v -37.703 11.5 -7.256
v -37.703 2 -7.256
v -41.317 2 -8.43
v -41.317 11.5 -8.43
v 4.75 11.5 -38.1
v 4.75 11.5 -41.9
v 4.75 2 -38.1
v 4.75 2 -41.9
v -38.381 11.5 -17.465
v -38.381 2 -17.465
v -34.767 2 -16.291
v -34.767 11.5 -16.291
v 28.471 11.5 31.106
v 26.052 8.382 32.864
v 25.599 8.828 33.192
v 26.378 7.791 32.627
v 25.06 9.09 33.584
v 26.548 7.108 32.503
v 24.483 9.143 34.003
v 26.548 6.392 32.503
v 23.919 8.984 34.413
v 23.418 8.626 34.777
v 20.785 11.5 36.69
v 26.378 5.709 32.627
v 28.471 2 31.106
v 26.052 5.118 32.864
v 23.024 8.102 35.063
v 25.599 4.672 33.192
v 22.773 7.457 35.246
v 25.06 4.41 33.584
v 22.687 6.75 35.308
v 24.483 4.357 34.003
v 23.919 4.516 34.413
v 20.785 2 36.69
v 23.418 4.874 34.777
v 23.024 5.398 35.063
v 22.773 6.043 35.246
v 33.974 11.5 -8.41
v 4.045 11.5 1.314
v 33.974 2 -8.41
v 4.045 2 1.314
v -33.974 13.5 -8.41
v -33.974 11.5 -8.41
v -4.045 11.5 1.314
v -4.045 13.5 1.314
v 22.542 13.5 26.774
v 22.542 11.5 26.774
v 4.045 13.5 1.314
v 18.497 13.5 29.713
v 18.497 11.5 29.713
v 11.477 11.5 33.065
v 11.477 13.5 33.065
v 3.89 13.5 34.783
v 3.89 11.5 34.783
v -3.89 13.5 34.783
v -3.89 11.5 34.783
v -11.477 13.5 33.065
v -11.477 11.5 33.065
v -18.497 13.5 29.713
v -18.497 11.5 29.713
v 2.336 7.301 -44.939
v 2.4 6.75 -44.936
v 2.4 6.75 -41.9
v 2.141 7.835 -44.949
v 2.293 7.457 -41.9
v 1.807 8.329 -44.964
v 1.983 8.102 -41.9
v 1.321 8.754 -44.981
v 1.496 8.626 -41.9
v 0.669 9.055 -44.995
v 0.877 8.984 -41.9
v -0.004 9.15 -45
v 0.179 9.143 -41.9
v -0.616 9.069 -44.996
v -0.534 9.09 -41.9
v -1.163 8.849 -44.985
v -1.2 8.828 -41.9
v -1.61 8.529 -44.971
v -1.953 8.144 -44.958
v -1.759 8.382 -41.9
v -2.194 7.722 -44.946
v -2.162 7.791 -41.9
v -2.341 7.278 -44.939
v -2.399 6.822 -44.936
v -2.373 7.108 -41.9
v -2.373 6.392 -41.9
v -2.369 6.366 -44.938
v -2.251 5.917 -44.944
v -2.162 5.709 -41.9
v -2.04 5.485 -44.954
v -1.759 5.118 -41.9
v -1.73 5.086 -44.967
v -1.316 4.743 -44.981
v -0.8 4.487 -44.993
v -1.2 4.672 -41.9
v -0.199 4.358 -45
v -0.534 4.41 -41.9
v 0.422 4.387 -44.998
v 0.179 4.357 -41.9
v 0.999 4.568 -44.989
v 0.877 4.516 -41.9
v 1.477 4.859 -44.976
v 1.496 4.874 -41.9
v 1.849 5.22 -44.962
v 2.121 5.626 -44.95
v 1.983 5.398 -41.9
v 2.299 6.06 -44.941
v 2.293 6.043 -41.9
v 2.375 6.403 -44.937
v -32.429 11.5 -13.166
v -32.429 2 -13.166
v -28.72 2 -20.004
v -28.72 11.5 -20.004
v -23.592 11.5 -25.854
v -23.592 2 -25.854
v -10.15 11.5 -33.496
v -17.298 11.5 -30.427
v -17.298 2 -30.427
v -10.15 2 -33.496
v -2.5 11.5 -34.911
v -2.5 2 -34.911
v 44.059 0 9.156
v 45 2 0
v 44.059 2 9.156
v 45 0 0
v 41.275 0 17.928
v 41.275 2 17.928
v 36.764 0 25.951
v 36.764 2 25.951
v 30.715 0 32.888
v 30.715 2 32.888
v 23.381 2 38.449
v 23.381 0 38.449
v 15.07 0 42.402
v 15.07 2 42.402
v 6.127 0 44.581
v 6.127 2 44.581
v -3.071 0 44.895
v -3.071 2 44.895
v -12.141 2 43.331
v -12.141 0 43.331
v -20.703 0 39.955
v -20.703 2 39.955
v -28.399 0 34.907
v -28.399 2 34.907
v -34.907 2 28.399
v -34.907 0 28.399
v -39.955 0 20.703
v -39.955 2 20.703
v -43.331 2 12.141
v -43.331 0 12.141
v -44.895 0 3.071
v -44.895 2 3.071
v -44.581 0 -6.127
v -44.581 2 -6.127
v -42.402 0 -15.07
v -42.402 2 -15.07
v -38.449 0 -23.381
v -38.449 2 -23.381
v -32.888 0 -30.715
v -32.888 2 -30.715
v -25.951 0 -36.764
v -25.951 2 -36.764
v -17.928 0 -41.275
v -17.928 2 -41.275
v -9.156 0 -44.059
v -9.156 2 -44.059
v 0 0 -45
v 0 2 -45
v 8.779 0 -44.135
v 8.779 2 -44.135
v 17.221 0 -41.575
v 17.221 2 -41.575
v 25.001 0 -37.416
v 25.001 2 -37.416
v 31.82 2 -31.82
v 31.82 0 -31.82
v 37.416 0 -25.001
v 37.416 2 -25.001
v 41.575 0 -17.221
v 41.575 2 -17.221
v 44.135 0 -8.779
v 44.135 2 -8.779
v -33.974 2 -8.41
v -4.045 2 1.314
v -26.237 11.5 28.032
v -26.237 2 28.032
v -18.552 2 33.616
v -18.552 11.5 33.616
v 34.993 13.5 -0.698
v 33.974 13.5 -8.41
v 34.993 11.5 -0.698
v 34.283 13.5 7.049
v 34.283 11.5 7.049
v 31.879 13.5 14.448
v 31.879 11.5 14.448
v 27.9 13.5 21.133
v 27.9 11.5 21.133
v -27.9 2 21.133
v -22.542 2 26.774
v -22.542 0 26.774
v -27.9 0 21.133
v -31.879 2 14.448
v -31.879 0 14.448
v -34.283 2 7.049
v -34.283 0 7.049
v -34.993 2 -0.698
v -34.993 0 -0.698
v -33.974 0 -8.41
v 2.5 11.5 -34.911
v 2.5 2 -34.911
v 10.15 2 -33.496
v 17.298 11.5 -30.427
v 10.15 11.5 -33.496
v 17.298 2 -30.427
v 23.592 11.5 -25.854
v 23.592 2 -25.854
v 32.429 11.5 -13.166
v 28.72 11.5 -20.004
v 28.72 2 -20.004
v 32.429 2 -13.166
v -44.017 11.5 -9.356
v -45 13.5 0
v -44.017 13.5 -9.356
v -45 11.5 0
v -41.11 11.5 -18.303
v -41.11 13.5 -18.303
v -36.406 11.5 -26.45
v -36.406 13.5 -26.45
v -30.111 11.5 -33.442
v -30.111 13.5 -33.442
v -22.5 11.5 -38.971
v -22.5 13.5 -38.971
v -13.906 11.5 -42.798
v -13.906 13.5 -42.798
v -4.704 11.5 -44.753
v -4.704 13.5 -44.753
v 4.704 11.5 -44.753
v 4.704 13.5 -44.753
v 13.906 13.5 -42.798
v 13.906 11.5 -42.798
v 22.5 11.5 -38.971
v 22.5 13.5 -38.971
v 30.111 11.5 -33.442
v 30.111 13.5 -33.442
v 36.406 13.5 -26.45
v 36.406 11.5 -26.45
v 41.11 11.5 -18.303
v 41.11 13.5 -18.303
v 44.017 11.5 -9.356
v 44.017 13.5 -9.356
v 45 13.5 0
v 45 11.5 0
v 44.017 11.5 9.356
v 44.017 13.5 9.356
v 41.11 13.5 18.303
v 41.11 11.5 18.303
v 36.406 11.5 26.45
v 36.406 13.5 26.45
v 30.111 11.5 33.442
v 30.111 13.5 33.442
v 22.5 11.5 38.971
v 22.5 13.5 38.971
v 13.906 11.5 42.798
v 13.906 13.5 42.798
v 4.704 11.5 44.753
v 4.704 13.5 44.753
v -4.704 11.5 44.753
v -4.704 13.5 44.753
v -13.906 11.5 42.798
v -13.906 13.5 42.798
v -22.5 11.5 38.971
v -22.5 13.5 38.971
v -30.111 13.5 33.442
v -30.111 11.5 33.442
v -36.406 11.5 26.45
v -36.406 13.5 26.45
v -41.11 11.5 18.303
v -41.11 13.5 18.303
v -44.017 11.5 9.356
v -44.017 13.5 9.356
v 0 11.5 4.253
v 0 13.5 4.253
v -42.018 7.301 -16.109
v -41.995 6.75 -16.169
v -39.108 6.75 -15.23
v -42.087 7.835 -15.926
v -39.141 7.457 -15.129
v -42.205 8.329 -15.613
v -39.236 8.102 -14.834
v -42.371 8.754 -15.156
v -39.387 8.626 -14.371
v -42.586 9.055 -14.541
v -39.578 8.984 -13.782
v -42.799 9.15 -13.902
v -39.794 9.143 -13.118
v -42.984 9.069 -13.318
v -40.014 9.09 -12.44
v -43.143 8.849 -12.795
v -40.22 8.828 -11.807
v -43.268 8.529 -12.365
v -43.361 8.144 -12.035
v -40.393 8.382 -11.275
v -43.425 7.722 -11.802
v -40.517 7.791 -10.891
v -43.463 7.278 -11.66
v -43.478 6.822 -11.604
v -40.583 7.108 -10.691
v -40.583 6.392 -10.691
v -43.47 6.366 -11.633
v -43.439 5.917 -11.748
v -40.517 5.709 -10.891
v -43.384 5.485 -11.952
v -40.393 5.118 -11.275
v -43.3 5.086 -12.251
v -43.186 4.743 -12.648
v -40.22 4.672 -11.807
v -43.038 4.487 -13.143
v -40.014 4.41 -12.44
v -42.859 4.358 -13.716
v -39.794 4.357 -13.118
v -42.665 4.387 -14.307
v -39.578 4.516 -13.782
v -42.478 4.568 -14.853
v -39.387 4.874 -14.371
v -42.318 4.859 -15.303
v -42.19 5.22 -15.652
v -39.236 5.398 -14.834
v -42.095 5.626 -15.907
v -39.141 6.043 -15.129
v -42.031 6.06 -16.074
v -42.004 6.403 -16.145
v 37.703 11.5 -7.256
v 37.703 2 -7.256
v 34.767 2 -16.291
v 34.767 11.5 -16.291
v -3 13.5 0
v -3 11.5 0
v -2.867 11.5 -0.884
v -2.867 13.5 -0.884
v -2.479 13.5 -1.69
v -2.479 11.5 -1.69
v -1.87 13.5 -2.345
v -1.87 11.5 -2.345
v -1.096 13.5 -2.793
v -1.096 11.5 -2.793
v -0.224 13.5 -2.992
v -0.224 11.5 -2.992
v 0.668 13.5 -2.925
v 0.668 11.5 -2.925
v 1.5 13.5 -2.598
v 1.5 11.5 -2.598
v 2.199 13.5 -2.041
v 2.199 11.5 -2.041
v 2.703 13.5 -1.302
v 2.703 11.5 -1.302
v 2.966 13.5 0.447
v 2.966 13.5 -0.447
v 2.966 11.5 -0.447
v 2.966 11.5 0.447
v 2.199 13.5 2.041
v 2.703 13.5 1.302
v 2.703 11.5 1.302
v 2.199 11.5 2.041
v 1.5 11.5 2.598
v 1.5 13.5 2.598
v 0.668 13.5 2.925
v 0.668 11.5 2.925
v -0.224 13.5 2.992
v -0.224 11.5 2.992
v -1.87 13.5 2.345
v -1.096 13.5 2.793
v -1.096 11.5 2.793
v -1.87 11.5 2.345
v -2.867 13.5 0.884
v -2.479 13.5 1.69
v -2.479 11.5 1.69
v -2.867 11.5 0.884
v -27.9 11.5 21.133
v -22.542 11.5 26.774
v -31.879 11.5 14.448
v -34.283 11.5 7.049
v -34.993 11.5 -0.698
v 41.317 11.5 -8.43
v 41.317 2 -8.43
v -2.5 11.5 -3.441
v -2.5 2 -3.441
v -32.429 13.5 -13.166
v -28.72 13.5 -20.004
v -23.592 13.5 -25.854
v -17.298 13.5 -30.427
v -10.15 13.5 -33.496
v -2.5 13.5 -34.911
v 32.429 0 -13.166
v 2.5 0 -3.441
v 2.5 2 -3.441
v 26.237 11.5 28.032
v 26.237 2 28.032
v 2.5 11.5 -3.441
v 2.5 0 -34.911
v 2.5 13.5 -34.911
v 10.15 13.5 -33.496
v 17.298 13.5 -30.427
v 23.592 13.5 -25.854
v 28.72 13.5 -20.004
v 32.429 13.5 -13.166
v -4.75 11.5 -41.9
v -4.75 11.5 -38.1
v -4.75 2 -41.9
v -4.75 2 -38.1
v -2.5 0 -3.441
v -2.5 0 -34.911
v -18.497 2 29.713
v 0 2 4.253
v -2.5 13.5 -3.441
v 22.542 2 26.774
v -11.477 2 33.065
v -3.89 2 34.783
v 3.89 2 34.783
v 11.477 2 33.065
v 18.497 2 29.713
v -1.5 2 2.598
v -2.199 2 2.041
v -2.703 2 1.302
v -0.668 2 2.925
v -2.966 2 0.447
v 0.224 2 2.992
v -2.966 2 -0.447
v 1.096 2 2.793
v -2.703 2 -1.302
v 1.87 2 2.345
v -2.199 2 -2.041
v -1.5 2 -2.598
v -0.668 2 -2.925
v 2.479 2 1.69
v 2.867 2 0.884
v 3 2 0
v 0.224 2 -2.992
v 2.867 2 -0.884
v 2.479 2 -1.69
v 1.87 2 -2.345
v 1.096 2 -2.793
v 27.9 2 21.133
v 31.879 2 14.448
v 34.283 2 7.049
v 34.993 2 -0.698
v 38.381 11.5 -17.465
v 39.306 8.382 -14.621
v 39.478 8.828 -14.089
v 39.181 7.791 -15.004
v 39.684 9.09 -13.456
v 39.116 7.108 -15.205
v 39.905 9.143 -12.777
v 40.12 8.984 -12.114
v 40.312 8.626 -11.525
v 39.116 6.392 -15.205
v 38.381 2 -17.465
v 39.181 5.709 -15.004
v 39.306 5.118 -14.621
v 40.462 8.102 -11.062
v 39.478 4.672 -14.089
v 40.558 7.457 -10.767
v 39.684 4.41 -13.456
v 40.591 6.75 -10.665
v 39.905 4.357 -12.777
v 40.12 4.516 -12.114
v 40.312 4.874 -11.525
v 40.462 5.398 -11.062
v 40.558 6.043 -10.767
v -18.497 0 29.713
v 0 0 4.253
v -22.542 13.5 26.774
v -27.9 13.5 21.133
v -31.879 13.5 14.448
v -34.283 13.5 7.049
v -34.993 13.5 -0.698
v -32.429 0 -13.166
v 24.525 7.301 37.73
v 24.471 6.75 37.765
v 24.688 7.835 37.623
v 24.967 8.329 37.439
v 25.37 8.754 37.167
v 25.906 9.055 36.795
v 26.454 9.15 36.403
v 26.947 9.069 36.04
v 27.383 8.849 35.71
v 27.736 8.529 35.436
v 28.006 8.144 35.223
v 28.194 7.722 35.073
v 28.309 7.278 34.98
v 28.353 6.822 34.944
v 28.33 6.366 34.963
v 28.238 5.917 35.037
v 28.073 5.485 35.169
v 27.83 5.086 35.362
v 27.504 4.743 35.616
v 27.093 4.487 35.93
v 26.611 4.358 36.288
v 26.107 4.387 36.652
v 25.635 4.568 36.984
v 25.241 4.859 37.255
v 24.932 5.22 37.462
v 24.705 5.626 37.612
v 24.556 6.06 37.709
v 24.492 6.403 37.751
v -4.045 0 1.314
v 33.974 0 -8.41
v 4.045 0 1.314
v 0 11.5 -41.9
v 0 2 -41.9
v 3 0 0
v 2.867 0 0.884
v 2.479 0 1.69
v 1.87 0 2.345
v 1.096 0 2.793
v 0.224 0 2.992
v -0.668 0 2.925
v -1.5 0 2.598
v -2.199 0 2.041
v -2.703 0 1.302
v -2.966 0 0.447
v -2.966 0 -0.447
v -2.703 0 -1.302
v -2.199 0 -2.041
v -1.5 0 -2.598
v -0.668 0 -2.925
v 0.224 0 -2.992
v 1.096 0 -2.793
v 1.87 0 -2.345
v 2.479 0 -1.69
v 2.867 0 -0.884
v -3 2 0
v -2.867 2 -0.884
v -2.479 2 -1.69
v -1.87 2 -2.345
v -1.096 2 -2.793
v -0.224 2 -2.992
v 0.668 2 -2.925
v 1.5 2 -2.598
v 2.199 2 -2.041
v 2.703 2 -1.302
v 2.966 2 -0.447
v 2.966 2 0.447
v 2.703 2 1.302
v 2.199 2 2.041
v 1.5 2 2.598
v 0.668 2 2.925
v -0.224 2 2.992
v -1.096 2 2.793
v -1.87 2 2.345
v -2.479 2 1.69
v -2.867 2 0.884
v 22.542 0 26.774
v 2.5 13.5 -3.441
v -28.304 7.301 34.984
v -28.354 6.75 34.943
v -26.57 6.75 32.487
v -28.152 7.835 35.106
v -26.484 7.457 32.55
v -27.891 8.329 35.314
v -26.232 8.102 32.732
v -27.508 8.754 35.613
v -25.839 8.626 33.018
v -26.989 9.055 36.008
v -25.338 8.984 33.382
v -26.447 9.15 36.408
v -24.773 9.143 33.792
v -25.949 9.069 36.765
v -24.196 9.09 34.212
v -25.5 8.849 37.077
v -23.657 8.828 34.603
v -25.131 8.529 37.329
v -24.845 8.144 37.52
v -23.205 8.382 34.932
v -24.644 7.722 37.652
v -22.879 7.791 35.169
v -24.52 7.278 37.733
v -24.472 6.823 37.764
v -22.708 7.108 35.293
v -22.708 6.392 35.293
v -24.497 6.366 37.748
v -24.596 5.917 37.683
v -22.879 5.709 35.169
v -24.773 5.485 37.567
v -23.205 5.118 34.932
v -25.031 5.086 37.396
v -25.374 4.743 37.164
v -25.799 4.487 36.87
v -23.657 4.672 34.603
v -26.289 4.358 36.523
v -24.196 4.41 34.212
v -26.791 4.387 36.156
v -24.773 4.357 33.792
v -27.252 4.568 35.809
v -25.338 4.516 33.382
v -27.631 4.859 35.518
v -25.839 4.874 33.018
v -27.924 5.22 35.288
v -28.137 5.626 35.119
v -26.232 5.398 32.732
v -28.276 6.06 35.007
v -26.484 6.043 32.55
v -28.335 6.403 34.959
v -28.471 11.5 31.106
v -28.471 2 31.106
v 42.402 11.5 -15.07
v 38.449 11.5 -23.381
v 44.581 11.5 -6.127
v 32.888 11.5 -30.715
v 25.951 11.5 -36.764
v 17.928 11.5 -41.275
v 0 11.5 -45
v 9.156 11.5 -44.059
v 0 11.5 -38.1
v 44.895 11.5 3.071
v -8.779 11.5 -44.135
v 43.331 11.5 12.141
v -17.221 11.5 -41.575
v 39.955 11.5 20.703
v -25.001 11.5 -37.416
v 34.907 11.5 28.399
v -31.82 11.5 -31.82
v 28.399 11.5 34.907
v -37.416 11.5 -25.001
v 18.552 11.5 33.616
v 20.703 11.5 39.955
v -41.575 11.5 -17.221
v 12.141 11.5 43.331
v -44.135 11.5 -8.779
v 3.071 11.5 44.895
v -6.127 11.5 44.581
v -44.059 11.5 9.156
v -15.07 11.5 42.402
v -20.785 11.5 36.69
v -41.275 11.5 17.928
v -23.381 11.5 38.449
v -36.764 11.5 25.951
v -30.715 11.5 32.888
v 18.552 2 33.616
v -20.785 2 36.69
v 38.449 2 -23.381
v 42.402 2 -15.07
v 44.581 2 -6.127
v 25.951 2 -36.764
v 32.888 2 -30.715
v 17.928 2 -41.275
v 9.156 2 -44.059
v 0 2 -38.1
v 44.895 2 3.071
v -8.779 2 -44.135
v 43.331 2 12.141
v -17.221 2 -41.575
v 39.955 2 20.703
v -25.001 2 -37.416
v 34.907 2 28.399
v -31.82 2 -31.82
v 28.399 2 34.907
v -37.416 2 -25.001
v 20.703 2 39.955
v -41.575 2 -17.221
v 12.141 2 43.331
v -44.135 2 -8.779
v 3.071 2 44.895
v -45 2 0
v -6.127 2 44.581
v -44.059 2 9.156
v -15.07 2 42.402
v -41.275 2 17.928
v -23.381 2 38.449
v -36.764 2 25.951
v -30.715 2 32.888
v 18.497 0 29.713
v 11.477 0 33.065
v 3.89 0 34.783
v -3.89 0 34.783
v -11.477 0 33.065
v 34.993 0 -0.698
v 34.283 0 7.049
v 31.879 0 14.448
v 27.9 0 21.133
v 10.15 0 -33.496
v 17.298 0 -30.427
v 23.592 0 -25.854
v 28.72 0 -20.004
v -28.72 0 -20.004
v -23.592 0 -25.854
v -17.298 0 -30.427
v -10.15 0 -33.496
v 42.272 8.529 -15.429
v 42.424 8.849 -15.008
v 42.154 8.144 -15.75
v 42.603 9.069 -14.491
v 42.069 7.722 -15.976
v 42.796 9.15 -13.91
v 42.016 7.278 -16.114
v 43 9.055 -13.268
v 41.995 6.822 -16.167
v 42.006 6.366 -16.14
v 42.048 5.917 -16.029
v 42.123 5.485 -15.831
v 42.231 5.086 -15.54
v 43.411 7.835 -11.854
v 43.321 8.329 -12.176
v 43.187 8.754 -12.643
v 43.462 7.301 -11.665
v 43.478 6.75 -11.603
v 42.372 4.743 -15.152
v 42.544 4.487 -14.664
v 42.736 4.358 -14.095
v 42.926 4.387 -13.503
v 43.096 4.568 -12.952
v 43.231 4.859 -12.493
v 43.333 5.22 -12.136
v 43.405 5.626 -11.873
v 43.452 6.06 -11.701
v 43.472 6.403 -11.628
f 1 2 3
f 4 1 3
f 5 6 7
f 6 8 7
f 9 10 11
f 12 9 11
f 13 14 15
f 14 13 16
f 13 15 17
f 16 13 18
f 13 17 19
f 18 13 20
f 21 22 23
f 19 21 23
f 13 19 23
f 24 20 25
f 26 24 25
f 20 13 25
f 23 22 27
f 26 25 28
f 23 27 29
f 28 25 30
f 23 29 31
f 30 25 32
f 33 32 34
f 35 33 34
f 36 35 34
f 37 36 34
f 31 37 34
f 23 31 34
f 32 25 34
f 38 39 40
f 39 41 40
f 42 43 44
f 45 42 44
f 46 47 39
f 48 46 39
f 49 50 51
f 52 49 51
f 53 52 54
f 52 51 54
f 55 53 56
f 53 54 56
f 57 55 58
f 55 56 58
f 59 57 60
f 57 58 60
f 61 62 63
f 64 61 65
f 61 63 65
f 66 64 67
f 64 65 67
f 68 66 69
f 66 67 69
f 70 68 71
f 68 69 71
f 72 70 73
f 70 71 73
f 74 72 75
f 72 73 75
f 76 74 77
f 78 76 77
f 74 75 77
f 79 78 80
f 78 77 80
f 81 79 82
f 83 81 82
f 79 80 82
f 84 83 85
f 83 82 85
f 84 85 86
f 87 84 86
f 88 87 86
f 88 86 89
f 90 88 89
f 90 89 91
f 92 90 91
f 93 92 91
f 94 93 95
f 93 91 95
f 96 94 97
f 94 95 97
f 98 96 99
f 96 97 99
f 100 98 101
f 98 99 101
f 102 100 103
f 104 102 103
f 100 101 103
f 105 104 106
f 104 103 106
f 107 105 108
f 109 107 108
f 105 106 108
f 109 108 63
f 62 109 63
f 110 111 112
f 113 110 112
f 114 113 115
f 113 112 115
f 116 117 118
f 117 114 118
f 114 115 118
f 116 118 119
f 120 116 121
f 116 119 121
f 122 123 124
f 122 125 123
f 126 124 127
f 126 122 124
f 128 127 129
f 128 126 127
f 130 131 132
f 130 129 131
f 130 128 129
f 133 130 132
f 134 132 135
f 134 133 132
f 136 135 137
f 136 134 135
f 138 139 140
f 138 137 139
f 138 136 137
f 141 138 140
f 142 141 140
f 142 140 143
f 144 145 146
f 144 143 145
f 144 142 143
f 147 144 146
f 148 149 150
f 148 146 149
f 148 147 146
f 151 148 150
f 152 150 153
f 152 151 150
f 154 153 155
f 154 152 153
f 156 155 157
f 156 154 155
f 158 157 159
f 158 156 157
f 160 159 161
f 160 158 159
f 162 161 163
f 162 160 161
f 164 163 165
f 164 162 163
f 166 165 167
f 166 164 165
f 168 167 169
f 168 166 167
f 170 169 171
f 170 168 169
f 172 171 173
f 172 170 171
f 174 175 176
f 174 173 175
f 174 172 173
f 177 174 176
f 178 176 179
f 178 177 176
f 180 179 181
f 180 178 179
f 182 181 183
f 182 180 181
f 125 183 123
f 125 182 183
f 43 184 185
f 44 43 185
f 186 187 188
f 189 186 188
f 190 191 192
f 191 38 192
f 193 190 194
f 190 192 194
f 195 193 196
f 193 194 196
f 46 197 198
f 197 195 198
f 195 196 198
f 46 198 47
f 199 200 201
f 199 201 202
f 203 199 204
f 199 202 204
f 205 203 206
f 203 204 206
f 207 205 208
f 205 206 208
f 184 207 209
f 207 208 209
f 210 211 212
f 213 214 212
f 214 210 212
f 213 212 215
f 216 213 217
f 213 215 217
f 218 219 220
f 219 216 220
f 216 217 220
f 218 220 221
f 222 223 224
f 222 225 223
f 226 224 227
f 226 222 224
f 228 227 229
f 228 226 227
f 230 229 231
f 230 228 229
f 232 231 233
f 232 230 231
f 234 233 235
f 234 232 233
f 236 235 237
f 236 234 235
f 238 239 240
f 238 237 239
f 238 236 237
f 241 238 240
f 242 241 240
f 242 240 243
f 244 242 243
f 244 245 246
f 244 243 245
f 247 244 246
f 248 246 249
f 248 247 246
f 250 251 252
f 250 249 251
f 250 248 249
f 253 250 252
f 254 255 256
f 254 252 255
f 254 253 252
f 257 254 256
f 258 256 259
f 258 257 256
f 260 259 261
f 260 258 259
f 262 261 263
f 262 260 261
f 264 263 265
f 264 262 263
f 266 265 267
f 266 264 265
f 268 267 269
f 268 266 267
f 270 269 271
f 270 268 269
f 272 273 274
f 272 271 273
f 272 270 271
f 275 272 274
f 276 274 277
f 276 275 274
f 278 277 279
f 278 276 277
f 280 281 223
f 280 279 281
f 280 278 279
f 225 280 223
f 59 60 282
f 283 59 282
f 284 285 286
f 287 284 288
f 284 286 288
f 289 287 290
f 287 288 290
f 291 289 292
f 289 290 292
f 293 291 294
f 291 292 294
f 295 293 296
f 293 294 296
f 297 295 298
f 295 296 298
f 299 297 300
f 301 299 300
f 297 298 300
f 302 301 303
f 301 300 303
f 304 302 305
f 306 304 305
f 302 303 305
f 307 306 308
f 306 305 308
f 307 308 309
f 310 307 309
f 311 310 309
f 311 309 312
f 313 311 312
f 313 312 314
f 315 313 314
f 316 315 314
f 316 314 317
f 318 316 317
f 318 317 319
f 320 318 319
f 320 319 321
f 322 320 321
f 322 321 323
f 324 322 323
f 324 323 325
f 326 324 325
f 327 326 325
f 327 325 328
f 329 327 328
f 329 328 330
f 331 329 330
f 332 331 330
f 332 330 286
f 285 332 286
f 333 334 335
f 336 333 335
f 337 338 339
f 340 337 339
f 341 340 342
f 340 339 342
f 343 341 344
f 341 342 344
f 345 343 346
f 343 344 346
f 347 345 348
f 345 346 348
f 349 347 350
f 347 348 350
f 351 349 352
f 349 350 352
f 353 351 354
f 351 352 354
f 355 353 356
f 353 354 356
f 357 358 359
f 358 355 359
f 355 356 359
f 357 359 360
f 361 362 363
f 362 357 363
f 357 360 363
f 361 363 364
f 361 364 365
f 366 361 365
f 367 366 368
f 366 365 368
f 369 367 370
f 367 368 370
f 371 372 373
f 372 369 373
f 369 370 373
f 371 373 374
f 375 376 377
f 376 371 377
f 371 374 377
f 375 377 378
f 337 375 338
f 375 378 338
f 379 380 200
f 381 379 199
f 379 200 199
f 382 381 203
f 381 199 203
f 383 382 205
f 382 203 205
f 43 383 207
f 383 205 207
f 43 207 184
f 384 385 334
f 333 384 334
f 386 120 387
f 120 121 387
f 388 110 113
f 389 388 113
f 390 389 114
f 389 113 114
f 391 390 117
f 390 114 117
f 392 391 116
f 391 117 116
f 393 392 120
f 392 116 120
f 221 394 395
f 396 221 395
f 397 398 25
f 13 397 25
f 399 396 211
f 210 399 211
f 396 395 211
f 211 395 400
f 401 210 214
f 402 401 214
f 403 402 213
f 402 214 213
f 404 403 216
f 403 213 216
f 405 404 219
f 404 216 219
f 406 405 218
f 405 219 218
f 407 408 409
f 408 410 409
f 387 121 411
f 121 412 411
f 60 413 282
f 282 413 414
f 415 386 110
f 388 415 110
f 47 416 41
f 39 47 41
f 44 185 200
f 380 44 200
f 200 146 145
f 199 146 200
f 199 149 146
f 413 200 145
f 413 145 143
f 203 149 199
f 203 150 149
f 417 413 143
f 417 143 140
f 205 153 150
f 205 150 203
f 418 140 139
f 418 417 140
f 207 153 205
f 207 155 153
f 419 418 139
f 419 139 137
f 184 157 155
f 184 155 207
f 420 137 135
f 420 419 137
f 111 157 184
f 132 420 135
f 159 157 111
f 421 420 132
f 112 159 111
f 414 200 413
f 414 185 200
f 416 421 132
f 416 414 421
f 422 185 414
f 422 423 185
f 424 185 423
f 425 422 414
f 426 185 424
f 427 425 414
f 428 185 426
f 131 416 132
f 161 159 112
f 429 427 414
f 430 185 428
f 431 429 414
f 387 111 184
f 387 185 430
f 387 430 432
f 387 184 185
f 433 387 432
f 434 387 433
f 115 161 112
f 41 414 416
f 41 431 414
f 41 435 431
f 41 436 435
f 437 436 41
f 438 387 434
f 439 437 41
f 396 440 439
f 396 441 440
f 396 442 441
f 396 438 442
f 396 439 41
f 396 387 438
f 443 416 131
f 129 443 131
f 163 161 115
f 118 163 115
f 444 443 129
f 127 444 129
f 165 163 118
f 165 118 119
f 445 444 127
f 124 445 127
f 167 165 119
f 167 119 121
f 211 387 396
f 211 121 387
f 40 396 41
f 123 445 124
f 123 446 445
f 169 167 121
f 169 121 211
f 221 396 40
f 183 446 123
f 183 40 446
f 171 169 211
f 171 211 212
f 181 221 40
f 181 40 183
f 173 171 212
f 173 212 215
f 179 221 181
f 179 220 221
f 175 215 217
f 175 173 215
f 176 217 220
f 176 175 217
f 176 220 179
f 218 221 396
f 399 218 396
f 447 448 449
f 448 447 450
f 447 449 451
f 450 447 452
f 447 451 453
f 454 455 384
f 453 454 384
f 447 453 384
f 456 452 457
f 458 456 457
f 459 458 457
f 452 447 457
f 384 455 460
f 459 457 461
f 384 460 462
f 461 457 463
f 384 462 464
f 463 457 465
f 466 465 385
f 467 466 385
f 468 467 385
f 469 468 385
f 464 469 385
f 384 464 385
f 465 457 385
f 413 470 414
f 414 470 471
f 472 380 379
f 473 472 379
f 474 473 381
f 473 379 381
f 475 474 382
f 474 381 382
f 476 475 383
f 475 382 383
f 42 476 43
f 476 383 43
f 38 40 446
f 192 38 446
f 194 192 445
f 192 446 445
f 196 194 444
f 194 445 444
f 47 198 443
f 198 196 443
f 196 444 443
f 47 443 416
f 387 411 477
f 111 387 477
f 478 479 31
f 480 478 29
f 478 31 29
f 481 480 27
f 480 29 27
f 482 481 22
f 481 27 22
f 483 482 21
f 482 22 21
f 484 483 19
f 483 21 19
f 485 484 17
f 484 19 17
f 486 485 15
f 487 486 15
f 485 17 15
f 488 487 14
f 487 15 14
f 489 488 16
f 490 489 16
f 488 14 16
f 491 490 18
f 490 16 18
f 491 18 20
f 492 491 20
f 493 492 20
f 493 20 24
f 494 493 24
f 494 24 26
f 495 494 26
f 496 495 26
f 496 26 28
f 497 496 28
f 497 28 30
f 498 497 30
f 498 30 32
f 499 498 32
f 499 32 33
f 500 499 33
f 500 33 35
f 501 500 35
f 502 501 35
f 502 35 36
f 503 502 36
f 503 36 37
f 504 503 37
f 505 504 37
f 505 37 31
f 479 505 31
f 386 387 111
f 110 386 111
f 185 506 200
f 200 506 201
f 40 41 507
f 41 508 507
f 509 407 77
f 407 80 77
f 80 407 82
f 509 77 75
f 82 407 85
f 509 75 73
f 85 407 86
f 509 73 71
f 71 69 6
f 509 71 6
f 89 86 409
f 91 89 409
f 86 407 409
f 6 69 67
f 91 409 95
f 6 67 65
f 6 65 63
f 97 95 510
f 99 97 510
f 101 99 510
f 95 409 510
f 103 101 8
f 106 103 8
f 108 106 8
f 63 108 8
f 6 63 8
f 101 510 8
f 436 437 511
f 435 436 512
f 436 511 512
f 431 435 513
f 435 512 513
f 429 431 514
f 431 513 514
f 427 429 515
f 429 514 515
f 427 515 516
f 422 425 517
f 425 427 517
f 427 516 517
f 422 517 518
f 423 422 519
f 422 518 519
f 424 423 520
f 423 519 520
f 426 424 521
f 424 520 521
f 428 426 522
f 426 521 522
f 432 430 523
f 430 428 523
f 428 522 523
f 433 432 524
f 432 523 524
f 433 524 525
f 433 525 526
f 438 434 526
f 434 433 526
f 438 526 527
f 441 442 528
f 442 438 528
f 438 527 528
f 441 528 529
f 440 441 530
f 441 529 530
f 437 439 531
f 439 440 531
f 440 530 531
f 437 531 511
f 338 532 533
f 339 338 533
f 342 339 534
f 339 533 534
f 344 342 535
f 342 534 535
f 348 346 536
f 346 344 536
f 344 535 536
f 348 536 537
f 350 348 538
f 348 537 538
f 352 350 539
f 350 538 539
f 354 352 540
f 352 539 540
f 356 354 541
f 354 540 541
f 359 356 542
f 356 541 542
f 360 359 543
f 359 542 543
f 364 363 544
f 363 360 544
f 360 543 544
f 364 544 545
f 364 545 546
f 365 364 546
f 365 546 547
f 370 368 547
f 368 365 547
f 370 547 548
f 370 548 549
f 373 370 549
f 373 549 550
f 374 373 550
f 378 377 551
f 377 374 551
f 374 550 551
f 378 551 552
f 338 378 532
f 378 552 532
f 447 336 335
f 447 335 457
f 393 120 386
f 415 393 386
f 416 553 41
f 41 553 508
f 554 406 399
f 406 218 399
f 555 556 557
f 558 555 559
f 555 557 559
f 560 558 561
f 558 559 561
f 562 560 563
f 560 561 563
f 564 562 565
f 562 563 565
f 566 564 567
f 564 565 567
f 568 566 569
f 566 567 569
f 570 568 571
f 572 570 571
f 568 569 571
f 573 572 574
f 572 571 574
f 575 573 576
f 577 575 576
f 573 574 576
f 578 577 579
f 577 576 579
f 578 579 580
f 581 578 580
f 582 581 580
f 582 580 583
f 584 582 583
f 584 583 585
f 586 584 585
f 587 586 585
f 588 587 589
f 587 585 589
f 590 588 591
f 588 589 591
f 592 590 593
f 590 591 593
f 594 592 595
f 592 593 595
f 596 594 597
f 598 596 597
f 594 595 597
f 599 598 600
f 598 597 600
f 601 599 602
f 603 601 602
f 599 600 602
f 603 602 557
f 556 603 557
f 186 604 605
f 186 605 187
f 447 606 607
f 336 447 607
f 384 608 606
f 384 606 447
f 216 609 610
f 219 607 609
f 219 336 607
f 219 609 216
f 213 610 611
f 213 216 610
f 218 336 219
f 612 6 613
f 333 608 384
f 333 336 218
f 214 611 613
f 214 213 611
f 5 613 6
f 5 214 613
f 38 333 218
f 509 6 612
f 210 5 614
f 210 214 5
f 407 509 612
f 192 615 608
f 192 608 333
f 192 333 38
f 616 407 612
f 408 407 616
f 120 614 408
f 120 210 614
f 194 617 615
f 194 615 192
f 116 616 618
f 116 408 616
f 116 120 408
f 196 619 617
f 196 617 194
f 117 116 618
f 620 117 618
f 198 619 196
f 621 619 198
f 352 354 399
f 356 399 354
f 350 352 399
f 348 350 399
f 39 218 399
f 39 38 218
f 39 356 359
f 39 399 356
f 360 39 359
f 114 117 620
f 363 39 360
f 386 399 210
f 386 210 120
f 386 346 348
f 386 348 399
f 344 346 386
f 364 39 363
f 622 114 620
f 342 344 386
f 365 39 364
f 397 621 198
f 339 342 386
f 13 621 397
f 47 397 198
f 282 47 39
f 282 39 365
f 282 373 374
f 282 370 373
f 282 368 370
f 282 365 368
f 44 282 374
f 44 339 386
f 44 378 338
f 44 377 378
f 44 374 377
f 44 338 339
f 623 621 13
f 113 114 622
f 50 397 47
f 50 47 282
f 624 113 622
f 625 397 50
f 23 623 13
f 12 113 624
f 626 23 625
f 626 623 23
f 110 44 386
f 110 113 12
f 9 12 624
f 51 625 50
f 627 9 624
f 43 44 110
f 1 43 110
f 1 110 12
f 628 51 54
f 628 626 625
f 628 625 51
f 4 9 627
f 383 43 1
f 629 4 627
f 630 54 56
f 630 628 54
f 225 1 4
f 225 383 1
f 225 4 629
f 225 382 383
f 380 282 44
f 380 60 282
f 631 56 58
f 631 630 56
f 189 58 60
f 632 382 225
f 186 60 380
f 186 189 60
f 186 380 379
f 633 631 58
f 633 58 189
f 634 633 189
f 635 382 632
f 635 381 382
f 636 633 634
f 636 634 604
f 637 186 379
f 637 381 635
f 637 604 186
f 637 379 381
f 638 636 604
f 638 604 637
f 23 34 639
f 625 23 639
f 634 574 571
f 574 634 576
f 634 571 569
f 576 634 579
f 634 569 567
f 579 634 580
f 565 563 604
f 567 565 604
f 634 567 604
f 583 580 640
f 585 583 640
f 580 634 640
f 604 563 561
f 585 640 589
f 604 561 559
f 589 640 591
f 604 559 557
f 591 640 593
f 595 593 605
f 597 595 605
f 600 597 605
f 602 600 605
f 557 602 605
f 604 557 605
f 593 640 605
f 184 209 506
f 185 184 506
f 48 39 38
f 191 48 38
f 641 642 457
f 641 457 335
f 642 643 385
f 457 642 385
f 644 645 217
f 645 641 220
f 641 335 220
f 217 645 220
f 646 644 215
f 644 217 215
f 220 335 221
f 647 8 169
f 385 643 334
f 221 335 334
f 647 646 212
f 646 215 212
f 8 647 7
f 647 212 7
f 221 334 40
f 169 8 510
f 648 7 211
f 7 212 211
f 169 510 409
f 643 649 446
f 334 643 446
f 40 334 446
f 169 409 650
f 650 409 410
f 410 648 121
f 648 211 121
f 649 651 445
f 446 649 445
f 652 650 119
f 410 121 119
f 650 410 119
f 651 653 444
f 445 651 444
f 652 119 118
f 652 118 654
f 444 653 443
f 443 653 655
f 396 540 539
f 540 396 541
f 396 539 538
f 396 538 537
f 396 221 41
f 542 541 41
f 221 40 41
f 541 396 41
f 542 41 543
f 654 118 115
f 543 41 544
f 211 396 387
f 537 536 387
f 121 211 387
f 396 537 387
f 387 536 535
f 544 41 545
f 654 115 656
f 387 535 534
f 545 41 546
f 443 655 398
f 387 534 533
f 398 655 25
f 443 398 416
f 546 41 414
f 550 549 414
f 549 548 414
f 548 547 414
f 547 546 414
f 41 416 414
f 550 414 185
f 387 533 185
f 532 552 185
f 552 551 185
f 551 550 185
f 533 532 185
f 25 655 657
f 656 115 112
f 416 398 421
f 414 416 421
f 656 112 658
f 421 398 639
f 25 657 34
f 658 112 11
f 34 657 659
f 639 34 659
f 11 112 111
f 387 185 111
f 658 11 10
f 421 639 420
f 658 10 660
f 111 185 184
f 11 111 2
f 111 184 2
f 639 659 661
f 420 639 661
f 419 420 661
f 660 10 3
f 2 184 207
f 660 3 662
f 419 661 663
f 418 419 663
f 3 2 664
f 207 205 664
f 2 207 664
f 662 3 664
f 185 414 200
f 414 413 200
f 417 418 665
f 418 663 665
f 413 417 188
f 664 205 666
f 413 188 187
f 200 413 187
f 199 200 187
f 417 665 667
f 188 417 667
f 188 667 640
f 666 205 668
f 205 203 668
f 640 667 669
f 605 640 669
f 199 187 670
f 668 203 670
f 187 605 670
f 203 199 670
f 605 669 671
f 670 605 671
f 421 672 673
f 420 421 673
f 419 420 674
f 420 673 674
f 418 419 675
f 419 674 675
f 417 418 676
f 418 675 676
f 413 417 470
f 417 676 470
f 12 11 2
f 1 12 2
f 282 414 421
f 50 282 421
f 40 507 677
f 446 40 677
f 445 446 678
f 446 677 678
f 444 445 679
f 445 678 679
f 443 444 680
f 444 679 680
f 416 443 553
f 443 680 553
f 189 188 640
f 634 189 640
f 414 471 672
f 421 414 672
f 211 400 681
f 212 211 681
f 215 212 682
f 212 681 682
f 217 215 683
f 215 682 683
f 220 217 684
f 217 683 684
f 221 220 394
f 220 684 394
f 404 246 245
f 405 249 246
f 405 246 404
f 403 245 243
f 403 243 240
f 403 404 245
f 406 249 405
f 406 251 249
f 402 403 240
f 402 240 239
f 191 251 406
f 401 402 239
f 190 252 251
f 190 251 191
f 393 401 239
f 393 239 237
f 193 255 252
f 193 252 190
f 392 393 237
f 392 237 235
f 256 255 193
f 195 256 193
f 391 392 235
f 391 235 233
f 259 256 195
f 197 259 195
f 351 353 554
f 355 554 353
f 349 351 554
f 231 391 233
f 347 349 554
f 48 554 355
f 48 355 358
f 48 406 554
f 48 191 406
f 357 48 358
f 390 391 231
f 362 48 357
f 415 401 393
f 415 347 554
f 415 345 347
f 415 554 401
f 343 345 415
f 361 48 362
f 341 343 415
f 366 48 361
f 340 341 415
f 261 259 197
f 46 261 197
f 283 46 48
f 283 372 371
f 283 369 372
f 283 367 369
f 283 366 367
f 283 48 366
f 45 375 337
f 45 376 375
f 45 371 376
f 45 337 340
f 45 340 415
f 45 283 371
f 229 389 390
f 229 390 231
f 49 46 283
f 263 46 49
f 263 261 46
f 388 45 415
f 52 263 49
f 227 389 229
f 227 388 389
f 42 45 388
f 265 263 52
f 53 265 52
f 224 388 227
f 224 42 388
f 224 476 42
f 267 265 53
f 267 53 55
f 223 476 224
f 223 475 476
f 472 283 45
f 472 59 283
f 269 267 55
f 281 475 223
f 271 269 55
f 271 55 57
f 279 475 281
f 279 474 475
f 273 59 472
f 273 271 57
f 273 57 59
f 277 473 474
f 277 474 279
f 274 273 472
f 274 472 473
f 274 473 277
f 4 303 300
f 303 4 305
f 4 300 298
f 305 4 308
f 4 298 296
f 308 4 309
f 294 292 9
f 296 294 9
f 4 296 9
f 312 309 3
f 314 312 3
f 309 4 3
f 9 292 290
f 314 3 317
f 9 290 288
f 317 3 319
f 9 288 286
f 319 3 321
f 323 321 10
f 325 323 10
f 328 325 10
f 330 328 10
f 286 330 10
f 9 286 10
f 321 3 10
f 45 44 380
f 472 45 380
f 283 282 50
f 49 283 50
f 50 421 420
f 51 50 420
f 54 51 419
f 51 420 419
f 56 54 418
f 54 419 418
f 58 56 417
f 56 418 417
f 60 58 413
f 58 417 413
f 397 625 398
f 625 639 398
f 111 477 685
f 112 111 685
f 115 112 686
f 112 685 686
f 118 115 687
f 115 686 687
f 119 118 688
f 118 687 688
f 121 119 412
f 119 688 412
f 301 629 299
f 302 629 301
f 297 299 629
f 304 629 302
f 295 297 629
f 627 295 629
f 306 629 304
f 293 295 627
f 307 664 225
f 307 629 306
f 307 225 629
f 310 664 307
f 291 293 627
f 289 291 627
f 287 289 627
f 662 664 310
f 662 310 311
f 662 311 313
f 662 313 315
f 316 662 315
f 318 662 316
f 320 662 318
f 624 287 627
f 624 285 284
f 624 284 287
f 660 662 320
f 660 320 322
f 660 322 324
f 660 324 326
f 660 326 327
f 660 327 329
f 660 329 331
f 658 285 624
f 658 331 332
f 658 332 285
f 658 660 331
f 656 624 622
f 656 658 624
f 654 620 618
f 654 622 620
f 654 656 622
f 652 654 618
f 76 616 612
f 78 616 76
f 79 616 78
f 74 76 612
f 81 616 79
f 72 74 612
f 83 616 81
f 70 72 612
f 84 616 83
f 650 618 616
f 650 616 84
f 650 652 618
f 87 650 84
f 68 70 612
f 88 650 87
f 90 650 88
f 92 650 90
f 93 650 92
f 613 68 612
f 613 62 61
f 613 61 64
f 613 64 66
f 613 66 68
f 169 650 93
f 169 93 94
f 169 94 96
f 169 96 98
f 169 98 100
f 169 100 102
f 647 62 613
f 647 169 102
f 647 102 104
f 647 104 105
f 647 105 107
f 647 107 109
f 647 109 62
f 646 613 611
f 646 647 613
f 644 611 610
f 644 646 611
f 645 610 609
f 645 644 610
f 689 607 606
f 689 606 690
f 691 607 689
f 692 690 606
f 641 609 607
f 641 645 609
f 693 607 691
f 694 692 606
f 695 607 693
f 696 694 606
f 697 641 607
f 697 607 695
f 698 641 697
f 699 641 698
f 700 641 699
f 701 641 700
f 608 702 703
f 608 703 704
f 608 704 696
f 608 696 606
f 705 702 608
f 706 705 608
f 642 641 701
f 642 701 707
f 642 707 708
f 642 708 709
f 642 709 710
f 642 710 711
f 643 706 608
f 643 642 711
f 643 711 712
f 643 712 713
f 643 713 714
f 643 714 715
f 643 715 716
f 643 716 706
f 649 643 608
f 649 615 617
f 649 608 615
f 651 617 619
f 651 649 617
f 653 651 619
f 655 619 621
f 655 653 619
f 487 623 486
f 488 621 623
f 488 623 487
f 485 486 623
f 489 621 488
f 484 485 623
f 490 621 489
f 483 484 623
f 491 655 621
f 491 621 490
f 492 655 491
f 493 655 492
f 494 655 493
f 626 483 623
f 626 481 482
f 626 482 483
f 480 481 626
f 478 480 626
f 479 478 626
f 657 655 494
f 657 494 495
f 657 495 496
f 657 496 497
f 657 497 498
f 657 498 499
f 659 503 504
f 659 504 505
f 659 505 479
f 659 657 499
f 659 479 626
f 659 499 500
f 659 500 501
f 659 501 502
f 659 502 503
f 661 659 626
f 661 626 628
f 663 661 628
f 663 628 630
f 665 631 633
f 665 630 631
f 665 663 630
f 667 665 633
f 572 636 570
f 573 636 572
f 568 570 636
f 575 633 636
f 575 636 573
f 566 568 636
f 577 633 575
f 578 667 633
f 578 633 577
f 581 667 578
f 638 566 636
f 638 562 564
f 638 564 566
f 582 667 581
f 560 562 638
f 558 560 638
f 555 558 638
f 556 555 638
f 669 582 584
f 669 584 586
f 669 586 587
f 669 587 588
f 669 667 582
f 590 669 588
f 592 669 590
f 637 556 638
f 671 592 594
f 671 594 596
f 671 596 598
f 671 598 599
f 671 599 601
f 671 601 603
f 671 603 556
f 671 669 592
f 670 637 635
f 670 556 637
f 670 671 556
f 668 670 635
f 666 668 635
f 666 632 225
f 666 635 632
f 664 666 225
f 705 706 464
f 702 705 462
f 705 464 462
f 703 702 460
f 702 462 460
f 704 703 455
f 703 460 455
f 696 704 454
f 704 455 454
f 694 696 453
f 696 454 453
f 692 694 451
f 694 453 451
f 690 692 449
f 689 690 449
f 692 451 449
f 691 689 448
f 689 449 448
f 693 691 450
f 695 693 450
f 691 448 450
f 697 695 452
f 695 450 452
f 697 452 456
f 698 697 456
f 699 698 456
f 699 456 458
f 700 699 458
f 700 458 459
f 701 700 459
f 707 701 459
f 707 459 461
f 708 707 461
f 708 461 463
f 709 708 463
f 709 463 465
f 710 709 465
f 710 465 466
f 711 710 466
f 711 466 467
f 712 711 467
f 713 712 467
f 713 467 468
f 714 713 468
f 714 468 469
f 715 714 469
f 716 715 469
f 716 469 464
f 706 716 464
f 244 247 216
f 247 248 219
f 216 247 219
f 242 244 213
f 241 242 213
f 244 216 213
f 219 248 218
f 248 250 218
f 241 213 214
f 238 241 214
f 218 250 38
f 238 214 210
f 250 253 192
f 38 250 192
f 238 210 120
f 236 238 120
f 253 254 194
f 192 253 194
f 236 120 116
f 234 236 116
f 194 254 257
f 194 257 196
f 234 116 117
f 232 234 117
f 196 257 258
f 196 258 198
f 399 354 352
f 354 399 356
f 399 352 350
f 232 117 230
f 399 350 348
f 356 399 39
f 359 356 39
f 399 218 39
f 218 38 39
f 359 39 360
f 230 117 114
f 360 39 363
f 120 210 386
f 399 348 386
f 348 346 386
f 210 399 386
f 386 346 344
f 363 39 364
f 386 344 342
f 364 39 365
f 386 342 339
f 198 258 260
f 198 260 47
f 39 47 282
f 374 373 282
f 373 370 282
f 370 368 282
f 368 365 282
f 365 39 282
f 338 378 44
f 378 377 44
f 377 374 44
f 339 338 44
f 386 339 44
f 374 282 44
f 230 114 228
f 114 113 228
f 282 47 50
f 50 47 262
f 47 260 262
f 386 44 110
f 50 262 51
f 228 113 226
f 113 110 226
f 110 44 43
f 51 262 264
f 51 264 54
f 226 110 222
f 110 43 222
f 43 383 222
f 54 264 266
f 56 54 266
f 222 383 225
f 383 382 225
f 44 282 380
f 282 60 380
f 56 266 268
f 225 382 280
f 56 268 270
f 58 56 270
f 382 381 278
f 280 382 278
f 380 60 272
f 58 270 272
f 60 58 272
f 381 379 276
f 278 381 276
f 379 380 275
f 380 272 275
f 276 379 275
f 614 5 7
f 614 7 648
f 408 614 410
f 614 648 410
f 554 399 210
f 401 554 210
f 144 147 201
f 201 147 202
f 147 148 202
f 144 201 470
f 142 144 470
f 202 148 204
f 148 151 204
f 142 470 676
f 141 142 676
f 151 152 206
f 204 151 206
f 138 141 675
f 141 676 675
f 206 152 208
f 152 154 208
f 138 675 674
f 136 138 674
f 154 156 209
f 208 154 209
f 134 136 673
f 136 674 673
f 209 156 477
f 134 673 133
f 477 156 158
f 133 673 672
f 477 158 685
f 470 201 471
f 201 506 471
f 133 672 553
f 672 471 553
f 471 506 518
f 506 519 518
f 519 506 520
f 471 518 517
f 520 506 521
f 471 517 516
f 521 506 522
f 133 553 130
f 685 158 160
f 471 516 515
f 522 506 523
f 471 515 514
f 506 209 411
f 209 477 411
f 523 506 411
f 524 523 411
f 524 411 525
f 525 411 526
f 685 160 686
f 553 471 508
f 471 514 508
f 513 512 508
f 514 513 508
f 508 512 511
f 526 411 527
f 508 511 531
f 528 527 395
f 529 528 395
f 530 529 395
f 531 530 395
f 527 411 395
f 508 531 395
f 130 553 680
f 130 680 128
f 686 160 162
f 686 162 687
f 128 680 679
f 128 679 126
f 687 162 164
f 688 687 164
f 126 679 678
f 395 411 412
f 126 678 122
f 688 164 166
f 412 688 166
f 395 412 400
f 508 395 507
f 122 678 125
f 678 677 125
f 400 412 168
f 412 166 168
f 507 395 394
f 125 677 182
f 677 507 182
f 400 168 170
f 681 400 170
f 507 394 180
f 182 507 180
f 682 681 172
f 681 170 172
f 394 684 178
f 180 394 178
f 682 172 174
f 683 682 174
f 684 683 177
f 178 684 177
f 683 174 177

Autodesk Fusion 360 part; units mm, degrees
sketch "Sketch1" plane through (0, 0, 0) normal (0, 1, 0) x (1, 0, 0)
  circle A0 centre (0, 0) radius 3
  circle A1 centre (0, 0) radius 8
  line L0 (0, 0) -> (0, 35)
  line L1 (0, 35) -> (-2.5, 35)
  line L2 (0, 35) -> (2.5, 35)
  line L3 (-2.5, 35) -> (-2.5, 0.0004)
  line L4 (-2.5, 0.0004) -> (2.5, 0.0004)
  line L5 (2.5, 0.0004) -> (2.5, 35)
  line L6 (0.7721, 2.3778) -> (-32.5144, 13.1932)
  line L7 (-34.0595, 8.438) -> (-0.773, -2.3775)
  line L8 (-33.287, 10.8156) -> (-34.0595, 8.438)
  line L9 (-33.287, 10.8156) -> (-32.5144, 13.1932)
  line L10 (-2.0228, 1.4691) -> (-22.595, -26.8461)
  line L11 (-18.5499, -29.7851) -> (2.0223, -1.4698)
  line L12 (-20.5725, -28.3156) -> (-18.5499, -29.7851)
  line L13 (-20.5725, -28.3156) -> (-22.595, -26.8461)
  line L14 (-2.0223, -1.4698) -> (18.5499, -29.7851)
  line L15 (22.595, -26.8461) -> (2.0228, 1.4691)
  line L16 (20.5725, -28.3156) -> (22.595, -26.8461)
  line L17 (20.5725, -28.3156) -> (18.5499, -29.7851)
  line L18 (0.773, -2.3775) -> (34.0595, 8.438)
  line L19 (32.5144, 13.1932) -> (-0.7721, 2.3778)
  line L20 (33.287, 10.8156) -> (32.5144, 13.1932)
  line L21 (33.287, 10.8156) -> (34.0595, 8.438)
  circle A2 centre (0, 0) radius 35
  line L22 (0, 35) -> (0, 45)
  circle A3 centre (0, 0) radius 45
  point P0 (0, 35)
  dimension "d1" = 6
  dimension "d2" = 16
  dimension "d3" = 35
  dimension "d4" = 2.5
  dimension "d6" = 360
  dimension "d7" = 10
extrude "Extrude1" add sketch "Sketch1" along normal blind 2 contours A0 L15 L18 | A0 A1 L5 L15 L18 L19 | A0 A1 L11 L14 L15 L18 | A0 L5 L19 | A0 L11 L14 | A0 A1 L0 L5 L19 | A1 L14 L15 A2 | A1 L18 L19 A2 | A0 A1 L7 L10 L11 L14 | A0 A1 L0 L3 L6 | A1 L0 L5 A2 | L15 L16 A2 | L18 L21 A2 | A0 L7 L10 | A1 L10 L11 A2 | A0 L3 L6 | A1 L0 L3 A2 | L2 L5 A2 | L19 L20 A2 | L14 L17 A2 | A0 A1 L3 L6 L7 L10 | L11 L12 A2 | L1 L3 A2 | A1 L6 L7 A2 | L10 L13 A2 | L7 L8 A2 | L6 L9 A2 | A3 makes body 1
sketch "Sketch2" plane through (0, 2, 0) normal (0, 1, 0) x (-1, 0, 0)
  arc A0 (-32.4294, -13.1656) -> (-2.5, -34.9106) centre (0, 0) ccw
  line L0 (-32.4294, -13.1656) -> (-2.5, -3.441)
  line L1 (-2.5, -3.441) -> (-2.5, -34.9106)
  arc A1 (2.5, -34.9106) -> (32.4294, -13.1656) centre (0, 0) ccw
  line L2 (2.5, -34.9106) -> (2.5, -3.441)
  line L3 (2.5, -3.441) -> (32.4294, -13.1656)
  line L4 (-22.5425, 26.7738) -> (-4.0451, 1.3143)
  line L5 (-4.0451, 1.3143) -> (-33.9745, -8.4103)
  arc A2 (-22.5425, 26.7738) -> (-33.9745, -8.4103) centre (0, 0) ccw
  arc A3 (33.9745, -8.4103) -> (22.5425, 26.7738) centre (0, 0) ccw
  line L6 (33.9745, -8.4103) -> (4.0451, 1.3143)
  line L7 (4.0451, 1.3143) -> (22.5425, 26.7738)
  arc A4 (18.4974, 29.7127) -> (-18.4974, 29.7127) centre (0, 0) ccw
  line L8 (18.4974, 29.7127) -> (0, 4.2533)
  line L9 (0, 4.2533) -> (-18.4974, 29.7127)
  circle A5 centre (0, 0) radius 3
  circle A6 centre (0, 0) radius 45
  circle A7 centre (0, 0) radius 35
  circle A8 centre (0, 0) radius 45
  line L10 (4.75, -41.9) -> (-4.75, -41.9)
  line L11 (-4.75, -41.9) -> (-4.75, -38.1)
  line L12 (-4.75, -38.1) -> (4.75, -38.1)
  line L13 (4.75, -38.1) -> (4.75, -41.9)
  line L14 (0, -35) -> (0, -38.1)
  line L15 (0, -45) -> (0, -41.9)
  line L16 (41.3171, -8.4303) -> (38.3814, -17.4653)
  line L17 (38.3814, -17.4653) -> (34.7674, -16.2911)
  line L18 (37.7031, -7.256) -> (41.3171, -8.4303)
  line L19 (34.7674, -16.2911) -> (37.7031, -7.256)
  line L20 (20.7854, 36.6898) -> (28.471, 31.1058)
  line L21 (28.471, 31.1058) -> (26.2374, 28.0316)
  line L22 (18.5518, 33.6155) -> (20.7854, 36.6898)
  line L23 (26.2374, 28.0316) -> (18.5518, 33.6155)
  line L24 (-28.471, 31.1058) -> (-20.7854, 36.6898)
  line L25 (-20.7854, 36.6898) -> (-18.5518, 33.6155)
  line L26 (-26.2374, 28.0316) -> (-28.471, 31.1058)
  line L27 (-18.5518, 33.6155) -> (-26.2374, 28.0316)
  line L28 (-38.3814, -17.4653) -> (-41.3171, -8.4303)
  line L29 (-41.3171, -8.4303) -> (-37.7031, -7.256)
  line L30 (-34.7674, -16.2911) -> (-38.3814, -17.4653)
  line L31 (-37.7031, -7.256) -> (-34.7674, -16.2911)
  dimension "d10" = 9.5
  dimension "d11" = 3.8
  dimension "d13" = 360
extrude "Extrude2" add sketch "Sketch2" along normal blind 9.5 separate body contours L0 L1 L2 L3 L4 L5 L6 L7 L8 L9 A7 | A6 A8 makes body 2
sketch "Sketch3" plane through (0, 0, -41.9) normal (0, 0, 1) x (1, 0, 0)
  line L0 (-4.75, 2) -> (4.75, 2)
  line L1 (4.75, 2) -> (4.75, 11.5)
  line L2 (4.75, 11.5) -> (-4.75, 11.5)
  line L3 (-4.75, 11.5) -> (-4.75, 2)
  line L4 (-4.75, 11.5) -> (4.75, 2) construction
  line L5 (4.75, 11.5) -> (-4.75, 2) construction
  circle A0 centre (0, 6.75) radius 2.4
  dimension "d16" = 4.8
extrude "Extrude3" cut sketch "Sketch3" against normal through all contours A0 bodies 2
pattern_circular "C-Pattern1" count 5 over 360 about axis through (0, 2, 0) along (0, 1, 0) of "Extrude3"
sketch "Sketch4" plane through (0, 11.5, 0) normal (0, 1, 0) x (-1, 0, 0)
  arc A0 (18.4974, 29.7127) -> (-18.4974, 29.7127) centre (0, 0) ccw
  line L0 (18.4974, 29.7127) -> (0, 4.2533)
  line L1 (0, 4.2533) -> (-18.4974, 29.7127)
  arc A1 (2.5, -34.9106) -> (32.4294, -13.1656) centre (0, 0) ccw
  line L2 (2.5, -34.9106) -> (2.5, -3.441)
  line L3 (2.5, -3.441) -> (32.4294, -13.1656)
  arc A2 (-22.5425, 26.7738) -> (-33.9745, -8.4103) centre (0, 0) ccw
  line L4 (-22.5425, 26.7738) -> (-4.0451, 1.3143)
  line L5 (-4.0451, 1.3143) -> (-33.9745, -8.4103)
  arc A3 (-32.4294, -13.1656) -> (-2.5, -34.9106) centre (0, 0) ccw
  line L6 (-32.4294, -13.1656) -> (-2.5, -3.441)
  line L7 (-2.5, -3.441) -> (-2.5, -34.9106)
  line L8 (33.9745, -8.4103) -> (4.0451, 1.3143)
  line L9 (4.0451, 1.3143) -> (22.5425, 26.7738)
  arc A4 (33.9745, -8.4103) -> (22.5425, 26.7738) centre (0, 0) ccw
  line L10 (-4.75, -38.1) -> (4.75, -38.1)
  line L11 (4.75, -38.1) -> (4.75, -41.9)
  line L12 (4.75, -41.9) -> (-4.75, -41.9)
  line L13 (-4.75, -41.9) -> (-4.75, -38.1)
  circle A5 centre (0, 0) radius 3
  line L14 (-20.7854, 36.6898) -> (-18.5518, 33.6155)
  line L15 (-18.5518, 33.6155) -> (-26.2374, 28.0316)
  line L16 (-26.2374, 28.0316) -> (-28.471, 31.1058)
  line L17 (-28.471, 31.1058) -> (-20.7854, 36.6898)
  line L18 (-41.3171, -8.4303) -> (-37.7031, -7.256)
  line L19 (-37.7031, -7.256) -> (-34.7674, -16.2911)
  line L20 (-34.7674, -16.2911) -> (-38.3814, -17.4653)
  line L21 (-38.3814, -17.4653) -> (-41.3171, -8.4303)
  line L22 (28.471, 31.1058) -> (26.2374, 28.0316)
  line L23 (26.2374, 28.0316) -> (18.5518, 33.6155)
  line L24 (18.5518, 33.6155) -> (20.7854, 36.6898)
  line L25 (20.7854, 36.6898) -> (28.471, 31.1058)
  line L26 (38.3814, -17.4653) -> (34.7674, -16.2911)
  line L27 (34.7674, -16.2911) -> (37.7031, -7.256)
  line L28 (37.7031, -7.256) -> (41.3171, -8.4303)
  line L29 (41.3171, -8.4303) -> (38.3814, -17.4653)
  circle A6 centre (0, 0) radius 45
extrude "Extrude4" add sketch "Sketch4" along normal blind 2 separate body contours L10 L11 L12 L13 | L14 L15 L16 L17 | L18 L19 L20 L21 | L22 L23 L24 L25 | L26 L27 L28 L29 | A6 makes body 3
